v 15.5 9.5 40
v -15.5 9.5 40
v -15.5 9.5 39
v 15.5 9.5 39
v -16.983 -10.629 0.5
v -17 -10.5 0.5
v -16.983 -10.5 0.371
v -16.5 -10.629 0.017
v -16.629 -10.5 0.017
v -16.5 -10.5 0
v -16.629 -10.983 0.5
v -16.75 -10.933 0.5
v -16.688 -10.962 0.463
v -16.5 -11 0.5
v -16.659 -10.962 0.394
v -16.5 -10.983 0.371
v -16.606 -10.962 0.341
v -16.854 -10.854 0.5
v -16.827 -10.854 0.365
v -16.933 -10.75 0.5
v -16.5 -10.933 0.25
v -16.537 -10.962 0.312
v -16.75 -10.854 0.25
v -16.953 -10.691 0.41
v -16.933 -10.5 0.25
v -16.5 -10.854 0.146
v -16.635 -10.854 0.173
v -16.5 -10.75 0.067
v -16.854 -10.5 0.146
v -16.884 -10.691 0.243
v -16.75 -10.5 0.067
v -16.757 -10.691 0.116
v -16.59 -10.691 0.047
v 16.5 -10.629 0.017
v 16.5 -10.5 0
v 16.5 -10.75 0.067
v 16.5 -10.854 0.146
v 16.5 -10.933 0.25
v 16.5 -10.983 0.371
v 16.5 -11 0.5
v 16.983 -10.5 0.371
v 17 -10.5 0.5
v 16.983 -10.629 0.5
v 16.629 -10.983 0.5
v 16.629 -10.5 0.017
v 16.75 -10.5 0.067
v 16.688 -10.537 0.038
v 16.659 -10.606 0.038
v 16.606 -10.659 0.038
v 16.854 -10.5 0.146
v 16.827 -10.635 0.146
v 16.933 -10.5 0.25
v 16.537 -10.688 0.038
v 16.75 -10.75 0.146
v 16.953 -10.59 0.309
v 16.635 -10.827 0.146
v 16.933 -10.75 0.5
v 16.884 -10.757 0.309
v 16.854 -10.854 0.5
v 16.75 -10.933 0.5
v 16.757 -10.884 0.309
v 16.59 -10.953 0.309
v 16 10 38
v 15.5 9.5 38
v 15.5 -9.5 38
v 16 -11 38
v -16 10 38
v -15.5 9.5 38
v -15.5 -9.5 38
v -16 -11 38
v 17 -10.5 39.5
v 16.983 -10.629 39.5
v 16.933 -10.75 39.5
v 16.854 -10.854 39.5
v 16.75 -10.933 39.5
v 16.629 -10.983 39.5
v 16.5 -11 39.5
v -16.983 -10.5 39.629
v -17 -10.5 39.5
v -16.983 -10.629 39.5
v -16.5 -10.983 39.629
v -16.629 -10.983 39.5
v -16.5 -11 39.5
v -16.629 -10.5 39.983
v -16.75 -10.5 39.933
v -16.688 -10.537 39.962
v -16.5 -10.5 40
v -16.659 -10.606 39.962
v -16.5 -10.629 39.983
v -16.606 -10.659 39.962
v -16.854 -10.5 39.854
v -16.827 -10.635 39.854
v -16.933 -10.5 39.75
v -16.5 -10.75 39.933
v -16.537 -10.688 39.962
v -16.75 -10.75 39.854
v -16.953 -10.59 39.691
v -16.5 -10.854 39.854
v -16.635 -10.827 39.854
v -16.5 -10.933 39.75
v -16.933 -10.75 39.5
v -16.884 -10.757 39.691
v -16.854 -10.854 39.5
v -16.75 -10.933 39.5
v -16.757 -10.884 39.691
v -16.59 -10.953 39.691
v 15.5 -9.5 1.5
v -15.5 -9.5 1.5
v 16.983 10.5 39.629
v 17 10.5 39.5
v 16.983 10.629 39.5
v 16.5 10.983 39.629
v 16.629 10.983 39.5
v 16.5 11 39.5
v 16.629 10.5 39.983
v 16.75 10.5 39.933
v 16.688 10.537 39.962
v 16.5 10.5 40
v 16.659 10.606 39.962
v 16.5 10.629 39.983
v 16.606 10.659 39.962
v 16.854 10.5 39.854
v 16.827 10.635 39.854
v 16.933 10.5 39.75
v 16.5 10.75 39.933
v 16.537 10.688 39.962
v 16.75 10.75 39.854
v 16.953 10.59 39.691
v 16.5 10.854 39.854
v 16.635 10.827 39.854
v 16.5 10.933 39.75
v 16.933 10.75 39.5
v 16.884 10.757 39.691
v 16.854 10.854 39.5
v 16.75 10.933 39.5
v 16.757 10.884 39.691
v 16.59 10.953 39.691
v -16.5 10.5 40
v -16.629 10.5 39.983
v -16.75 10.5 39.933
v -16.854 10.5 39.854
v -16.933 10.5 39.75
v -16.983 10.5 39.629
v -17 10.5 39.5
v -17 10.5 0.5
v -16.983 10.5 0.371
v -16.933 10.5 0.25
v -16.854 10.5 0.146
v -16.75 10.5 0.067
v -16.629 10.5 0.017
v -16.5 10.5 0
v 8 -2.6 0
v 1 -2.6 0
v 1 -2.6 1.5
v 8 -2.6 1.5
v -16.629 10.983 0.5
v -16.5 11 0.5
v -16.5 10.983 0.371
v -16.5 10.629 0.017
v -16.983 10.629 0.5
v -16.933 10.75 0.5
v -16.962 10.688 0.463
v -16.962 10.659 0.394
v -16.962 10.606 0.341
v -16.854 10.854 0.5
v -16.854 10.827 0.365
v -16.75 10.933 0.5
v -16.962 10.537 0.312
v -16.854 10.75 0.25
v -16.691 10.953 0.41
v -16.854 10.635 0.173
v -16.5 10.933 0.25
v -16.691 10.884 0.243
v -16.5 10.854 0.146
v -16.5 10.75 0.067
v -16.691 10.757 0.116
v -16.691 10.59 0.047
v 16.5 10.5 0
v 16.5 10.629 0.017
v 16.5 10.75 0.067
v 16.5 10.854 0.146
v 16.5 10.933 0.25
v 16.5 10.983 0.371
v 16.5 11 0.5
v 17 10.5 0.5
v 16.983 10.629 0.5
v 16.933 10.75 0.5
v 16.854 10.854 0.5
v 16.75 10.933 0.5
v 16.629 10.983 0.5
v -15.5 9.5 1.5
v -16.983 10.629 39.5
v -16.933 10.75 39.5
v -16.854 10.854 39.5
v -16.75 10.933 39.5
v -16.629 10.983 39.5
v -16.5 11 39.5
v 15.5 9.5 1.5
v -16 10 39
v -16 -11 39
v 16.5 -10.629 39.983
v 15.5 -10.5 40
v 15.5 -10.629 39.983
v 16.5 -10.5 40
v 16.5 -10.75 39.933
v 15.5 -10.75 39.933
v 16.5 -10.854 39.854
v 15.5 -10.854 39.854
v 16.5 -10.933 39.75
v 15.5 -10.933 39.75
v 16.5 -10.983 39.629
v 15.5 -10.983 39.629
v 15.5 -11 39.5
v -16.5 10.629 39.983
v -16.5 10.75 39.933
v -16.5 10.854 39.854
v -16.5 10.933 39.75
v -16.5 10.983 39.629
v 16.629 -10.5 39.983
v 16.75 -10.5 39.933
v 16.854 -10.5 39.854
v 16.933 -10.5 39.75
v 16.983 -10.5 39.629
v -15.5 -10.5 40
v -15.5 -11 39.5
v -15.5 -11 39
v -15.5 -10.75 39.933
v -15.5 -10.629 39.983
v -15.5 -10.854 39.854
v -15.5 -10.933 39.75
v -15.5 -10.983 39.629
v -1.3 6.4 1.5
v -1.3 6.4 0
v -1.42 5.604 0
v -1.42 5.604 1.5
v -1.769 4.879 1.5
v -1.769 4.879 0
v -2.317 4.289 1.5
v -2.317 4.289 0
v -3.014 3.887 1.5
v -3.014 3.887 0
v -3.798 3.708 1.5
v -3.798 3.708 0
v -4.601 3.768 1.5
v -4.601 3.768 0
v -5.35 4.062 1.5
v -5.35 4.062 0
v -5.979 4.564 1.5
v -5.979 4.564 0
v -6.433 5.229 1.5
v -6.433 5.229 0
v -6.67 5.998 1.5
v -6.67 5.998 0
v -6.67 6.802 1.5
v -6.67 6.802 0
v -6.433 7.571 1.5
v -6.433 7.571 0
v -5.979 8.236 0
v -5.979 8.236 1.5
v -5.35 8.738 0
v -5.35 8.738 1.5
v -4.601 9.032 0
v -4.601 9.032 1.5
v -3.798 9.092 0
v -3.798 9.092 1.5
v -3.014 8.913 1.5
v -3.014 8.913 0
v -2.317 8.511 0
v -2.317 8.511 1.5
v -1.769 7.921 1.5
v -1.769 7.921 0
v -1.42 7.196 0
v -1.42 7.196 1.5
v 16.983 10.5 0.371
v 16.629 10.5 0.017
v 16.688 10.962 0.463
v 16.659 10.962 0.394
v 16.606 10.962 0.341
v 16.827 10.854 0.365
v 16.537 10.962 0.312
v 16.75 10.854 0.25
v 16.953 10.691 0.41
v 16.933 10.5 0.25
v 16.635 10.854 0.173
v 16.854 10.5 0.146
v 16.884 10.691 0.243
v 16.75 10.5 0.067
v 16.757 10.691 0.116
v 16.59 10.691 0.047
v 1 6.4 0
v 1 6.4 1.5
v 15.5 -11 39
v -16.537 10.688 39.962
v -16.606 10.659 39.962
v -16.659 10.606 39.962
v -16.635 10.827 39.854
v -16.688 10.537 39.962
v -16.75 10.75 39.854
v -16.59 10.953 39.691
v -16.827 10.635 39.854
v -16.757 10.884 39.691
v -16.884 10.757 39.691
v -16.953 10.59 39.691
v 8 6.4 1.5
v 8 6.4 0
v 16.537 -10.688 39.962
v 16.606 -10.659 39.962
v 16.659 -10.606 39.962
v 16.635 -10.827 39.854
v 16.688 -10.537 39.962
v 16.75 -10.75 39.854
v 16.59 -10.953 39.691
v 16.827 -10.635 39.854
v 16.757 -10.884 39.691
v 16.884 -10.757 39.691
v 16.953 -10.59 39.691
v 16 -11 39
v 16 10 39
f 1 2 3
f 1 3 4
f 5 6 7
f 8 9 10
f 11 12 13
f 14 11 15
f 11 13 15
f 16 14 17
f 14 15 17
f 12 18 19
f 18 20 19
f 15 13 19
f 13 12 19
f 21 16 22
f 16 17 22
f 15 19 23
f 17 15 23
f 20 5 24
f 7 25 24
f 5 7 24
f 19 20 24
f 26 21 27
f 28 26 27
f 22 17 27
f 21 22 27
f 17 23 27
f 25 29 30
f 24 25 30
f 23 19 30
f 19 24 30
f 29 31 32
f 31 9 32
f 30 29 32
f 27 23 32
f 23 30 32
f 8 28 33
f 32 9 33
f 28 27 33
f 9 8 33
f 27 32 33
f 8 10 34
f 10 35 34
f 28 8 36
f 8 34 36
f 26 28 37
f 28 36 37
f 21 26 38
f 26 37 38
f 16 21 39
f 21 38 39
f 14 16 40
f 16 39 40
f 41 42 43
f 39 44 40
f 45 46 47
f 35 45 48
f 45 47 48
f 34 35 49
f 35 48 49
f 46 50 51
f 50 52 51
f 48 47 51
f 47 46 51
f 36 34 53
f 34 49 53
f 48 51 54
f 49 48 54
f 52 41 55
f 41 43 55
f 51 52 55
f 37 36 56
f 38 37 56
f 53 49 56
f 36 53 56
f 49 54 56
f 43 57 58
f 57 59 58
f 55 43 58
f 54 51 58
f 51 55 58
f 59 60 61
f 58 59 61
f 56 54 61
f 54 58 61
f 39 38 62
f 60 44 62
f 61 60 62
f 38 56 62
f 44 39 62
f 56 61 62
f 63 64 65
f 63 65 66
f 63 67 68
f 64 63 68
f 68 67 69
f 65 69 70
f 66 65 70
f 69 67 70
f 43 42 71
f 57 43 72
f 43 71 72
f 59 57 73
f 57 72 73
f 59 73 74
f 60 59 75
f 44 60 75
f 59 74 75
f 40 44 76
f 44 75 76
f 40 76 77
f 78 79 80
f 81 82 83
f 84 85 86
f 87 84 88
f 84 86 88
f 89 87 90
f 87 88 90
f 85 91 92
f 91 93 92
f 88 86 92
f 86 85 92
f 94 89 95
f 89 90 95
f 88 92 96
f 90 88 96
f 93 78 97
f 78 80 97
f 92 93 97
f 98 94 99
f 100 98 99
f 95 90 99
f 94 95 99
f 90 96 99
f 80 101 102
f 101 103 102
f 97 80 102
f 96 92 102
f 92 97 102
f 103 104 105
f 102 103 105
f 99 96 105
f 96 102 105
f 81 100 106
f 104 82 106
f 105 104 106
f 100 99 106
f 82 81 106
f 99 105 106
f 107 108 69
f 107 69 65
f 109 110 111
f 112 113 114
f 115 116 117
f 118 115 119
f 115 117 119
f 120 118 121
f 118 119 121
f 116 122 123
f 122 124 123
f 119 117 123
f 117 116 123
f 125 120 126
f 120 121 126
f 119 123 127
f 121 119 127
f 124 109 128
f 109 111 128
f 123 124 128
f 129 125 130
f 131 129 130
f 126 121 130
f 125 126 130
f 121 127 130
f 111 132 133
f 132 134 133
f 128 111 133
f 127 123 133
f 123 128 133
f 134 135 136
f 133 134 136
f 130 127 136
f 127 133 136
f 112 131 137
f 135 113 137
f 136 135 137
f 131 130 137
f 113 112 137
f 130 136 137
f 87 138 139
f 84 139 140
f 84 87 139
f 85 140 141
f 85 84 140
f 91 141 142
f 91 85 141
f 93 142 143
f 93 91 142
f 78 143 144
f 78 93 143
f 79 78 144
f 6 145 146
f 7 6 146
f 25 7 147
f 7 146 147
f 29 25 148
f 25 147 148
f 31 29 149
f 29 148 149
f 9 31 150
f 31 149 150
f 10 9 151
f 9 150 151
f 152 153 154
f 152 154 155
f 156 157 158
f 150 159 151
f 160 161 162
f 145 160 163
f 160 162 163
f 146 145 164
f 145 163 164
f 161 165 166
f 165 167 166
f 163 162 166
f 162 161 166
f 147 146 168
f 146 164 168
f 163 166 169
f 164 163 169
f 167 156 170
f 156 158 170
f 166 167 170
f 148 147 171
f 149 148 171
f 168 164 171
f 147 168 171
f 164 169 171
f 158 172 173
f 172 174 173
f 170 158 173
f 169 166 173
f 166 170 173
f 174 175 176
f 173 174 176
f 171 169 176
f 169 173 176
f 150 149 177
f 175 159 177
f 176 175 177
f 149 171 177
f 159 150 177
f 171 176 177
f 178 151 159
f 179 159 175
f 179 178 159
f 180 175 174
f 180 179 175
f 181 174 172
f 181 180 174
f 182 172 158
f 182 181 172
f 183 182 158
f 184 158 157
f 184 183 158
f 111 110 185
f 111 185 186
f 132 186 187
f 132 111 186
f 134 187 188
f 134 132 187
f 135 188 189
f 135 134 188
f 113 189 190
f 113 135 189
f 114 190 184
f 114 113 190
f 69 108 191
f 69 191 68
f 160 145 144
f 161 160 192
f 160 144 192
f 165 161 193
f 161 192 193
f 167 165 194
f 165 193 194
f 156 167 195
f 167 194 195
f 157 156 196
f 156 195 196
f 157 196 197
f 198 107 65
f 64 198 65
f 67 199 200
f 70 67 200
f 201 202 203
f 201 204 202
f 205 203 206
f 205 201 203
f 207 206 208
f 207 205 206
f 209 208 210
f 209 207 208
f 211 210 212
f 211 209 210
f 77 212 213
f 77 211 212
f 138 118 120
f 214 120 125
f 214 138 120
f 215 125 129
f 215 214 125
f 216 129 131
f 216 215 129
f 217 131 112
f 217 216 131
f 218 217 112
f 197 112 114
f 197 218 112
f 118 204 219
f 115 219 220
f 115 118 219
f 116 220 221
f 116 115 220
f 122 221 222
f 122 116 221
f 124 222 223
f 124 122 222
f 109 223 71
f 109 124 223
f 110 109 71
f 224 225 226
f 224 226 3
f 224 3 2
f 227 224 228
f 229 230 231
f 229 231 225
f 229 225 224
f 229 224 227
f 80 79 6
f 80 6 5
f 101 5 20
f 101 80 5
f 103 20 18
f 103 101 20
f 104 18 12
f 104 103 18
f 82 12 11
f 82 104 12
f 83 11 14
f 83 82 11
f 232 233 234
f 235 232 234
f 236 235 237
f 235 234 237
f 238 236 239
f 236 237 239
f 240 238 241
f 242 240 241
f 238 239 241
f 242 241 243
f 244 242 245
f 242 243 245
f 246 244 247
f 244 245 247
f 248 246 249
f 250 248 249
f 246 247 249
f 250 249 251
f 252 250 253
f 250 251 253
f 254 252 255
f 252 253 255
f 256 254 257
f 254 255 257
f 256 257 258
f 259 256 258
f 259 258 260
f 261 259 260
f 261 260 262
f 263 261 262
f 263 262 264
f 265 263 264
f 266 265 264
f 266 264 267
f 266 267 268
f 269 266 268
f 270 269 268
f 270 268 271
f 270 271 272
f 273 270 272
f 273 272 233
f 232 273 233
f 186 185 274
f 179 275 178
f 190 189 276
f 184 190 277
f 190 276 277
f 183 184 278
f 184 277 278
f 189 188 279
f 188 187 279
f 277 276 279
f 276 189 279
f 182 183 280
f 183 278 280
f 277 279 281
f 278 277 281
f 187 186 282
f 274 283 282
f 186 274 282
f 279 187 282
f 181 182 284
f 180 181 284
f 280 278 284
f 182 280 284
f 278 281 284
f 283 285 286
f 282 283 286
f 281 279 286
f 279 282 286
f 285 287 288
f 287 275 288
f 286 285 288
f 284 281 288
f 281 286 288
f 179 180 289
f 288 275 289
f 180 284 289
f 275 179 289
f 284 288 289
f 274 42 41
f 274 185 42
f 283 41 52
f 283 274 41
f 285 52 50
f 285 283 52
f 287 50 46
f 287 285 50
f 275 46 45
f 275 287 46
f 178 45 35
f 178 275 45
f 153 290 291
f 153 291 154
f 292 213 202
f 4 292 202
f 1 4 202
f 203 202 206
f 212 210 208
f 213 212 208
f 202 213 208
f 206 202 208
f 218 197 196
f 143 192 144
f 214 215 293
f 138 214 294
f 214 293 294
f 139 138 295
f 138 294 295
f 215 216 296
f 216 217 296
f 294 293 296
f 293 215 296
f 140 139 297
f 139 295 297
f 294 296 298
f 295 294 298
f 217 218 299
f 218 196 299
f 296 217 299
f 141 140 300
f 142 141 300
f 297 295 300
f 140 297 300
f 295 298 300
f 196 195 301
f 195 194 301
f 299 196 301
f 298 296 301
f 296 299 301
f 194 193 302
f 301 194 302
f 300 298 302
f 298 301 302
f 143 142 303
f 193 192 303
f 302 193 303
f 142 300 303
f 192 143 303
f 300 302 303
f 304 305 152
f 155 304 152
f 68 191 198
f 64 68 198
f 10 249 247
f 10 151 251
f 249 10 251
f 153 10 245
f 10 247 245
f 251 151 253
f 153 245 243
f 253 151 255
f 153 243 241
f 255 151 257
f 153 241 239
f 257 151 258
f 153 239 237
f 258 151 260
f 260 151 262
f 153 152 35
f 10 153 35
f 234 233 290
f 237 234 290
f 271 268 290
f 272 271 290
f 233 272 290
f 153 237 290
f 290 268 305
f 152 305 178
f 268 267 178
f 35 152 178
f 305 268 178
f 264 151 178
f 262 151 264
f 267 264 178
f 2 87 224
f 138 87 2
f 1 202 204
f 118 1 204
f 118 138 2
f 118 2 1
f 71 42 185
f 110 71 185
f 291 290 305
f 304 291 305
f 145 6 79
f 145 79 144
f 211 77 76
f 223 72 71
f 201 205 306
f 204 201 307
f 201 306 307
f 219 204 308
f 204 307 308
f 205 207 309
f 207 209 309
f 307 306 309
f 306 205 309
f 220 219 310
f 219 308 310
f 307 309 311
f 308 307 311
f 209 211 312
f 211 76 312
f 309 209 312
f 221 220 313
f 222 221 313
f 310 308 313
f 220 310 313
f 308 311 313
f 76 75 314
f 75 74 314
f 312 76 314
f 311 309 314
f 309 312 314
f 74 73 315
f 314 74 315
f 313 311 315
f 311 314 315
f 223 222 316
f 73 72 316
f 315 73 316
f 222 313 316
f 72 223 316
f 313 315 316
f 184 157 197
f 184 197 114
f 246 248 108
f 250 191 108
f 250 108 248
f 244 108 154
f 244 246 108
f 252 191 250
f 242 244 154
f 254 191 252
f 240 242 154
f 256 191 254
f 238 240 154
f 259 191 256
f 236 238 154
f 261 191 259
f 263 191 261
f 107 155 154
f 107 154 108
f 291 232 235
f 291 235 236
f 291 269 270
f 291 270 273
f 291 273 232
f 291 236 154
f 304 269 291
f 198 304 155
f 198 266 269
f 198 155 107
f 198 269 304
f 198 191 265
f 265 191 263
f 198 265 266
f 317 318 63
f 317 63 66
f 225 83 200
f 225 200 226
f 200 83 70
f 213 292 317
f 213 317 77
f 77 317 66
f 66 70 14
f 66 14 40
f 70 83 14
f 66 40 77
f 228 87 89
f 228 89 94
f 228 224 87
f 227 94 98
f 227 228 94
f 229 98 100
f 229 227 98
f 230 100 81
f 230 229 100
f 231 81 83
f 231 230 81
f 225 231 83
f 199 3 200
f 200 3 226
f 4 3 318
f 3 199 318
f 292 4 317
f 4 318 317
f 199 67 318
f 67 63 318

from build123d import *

# Parameters (mm, degrees)
SKETCH_W        = 34
SKETCH_H        = 22
PAD_DEPTH       = 40
SKETCH001_W     = 31
SKETCH001_H     = 19
POCKET_DEPTH    = 38.5
SKETCH002_R     = 2.7
SKETCH002_W     = 7
SKETCH002_H     = 9
POCKET001_DEPTH = 40.001
SKETCH003_W     = 31
SKETCH003_H     = 2
POCKET002_DEPTH = 1.5
SKETCH004_W     = 21
SKETCH004_H     = 1
POCKET003_DEPTH = 0.5
SKETCH009_W     = 32
SKETCH009_H     = 1
POCKET007_DEPTH = 0.5
FILLET_R        = 0.5
FILLET001_R     = 0.5


with BuildPart() as part:
    # Sketch → Pad (new body)
    with BuildSketch(Plane.XY):
        Rectangle(SKETCH_W, SKETCH_H)
    extrude(amount=PAD_DEPTH)

    # Sketch001 (on Face6 of Pad) → Pocket (cut)
    with BuildSketch(Plane.XY.offset(40)):
        Rectangle(SKETCH001_W, SKETCH001_H)
    extrude(amount=-POCKET_DEPTH, mode=Mode.SUBTRACT)

    # Sketch002 (on Face4 of Pocket) → Pocket001 (cut, through all)
    with BuildSketch(Plane(origin=(0, 0, 0), x_dir=(1, 0, 0), z_dir=(0, 0, -1))):
        with Locations((-4, -6.4)):
            Circle(SKETCH002_R)
        with Locations((4.5, -1.9)):
            Rectangle(SKETCH002_W, SKETCH002_H)
    extrude(amount=-POCKET001_DEPTH, mode=Mode.SUBTRACT)

    # Sketch003 (on Face6 of Pocket001) → Pocket002 (cut)
    with BuildSketch(Plane.XZ.offset(11)):
        with Locations((0, 39)):
            Rectangle(SKETCH003_W, SKETCH003_H)
    extrude(amount=-POCKET002_DEPTH, mode=Mode.SUBTRACT)

    # Sketch004 (on Face16 of Pocket002) → Pocket003 (cut)
    with BuildSketch(Plane(origin=(15.5, 0, 0), x_dir=(0, -1, 0), z_dir=(-1, 0, 0))):
        with Locations((0.5, 38.5)):
            Rectangle(SKETCH004_W, SKETCH004_H)
    pocket003 = extrude(amount=-POCKET003_DEPTH, mode=Mode.SUBTRACT)

    # Mirrored: Pocket003 across YZ
    add(pocket003.mirror(Plane.YZ), mode=Mode.SUBTRACT)

    # Sketch009 (on Face14 of Mirrored) → Pocket007 (cut)
    with BuildSketch(Plane.XZ.offset(-9.5)):
        with Locations((0, 38.5)):
            Rectangle(SKETCH009_W, SKETCH009_H)
    extrude(amount=-POCKET007_DEPTH, mode=Mode.SUBTRACT)

    # Fillet
    fillet_edges = [part.edges().sort_by_distance(p)[0] for p in [
        (17, -11, 20),
        (17, 0, 0),
        (17, 11, 20),
        (0, 11, 0),
        (-17, 11, 20),
        (-17, 0, 0),
        (-17, -11, 20),
        (0, -11, 0),
    ]]
    fillet(fillet_edges, radius=FILLET_R)

    # Fillet001
    fillet001_edges = [part.edges().sort_by_distance(p)[0] for p in [
        (17, 0, 40),
        (0, 11, 40),
        (-17, 0, 40),
    ]]
    fillet(fillet001_edges, radius=FILLET001_R)


solid = part.part
